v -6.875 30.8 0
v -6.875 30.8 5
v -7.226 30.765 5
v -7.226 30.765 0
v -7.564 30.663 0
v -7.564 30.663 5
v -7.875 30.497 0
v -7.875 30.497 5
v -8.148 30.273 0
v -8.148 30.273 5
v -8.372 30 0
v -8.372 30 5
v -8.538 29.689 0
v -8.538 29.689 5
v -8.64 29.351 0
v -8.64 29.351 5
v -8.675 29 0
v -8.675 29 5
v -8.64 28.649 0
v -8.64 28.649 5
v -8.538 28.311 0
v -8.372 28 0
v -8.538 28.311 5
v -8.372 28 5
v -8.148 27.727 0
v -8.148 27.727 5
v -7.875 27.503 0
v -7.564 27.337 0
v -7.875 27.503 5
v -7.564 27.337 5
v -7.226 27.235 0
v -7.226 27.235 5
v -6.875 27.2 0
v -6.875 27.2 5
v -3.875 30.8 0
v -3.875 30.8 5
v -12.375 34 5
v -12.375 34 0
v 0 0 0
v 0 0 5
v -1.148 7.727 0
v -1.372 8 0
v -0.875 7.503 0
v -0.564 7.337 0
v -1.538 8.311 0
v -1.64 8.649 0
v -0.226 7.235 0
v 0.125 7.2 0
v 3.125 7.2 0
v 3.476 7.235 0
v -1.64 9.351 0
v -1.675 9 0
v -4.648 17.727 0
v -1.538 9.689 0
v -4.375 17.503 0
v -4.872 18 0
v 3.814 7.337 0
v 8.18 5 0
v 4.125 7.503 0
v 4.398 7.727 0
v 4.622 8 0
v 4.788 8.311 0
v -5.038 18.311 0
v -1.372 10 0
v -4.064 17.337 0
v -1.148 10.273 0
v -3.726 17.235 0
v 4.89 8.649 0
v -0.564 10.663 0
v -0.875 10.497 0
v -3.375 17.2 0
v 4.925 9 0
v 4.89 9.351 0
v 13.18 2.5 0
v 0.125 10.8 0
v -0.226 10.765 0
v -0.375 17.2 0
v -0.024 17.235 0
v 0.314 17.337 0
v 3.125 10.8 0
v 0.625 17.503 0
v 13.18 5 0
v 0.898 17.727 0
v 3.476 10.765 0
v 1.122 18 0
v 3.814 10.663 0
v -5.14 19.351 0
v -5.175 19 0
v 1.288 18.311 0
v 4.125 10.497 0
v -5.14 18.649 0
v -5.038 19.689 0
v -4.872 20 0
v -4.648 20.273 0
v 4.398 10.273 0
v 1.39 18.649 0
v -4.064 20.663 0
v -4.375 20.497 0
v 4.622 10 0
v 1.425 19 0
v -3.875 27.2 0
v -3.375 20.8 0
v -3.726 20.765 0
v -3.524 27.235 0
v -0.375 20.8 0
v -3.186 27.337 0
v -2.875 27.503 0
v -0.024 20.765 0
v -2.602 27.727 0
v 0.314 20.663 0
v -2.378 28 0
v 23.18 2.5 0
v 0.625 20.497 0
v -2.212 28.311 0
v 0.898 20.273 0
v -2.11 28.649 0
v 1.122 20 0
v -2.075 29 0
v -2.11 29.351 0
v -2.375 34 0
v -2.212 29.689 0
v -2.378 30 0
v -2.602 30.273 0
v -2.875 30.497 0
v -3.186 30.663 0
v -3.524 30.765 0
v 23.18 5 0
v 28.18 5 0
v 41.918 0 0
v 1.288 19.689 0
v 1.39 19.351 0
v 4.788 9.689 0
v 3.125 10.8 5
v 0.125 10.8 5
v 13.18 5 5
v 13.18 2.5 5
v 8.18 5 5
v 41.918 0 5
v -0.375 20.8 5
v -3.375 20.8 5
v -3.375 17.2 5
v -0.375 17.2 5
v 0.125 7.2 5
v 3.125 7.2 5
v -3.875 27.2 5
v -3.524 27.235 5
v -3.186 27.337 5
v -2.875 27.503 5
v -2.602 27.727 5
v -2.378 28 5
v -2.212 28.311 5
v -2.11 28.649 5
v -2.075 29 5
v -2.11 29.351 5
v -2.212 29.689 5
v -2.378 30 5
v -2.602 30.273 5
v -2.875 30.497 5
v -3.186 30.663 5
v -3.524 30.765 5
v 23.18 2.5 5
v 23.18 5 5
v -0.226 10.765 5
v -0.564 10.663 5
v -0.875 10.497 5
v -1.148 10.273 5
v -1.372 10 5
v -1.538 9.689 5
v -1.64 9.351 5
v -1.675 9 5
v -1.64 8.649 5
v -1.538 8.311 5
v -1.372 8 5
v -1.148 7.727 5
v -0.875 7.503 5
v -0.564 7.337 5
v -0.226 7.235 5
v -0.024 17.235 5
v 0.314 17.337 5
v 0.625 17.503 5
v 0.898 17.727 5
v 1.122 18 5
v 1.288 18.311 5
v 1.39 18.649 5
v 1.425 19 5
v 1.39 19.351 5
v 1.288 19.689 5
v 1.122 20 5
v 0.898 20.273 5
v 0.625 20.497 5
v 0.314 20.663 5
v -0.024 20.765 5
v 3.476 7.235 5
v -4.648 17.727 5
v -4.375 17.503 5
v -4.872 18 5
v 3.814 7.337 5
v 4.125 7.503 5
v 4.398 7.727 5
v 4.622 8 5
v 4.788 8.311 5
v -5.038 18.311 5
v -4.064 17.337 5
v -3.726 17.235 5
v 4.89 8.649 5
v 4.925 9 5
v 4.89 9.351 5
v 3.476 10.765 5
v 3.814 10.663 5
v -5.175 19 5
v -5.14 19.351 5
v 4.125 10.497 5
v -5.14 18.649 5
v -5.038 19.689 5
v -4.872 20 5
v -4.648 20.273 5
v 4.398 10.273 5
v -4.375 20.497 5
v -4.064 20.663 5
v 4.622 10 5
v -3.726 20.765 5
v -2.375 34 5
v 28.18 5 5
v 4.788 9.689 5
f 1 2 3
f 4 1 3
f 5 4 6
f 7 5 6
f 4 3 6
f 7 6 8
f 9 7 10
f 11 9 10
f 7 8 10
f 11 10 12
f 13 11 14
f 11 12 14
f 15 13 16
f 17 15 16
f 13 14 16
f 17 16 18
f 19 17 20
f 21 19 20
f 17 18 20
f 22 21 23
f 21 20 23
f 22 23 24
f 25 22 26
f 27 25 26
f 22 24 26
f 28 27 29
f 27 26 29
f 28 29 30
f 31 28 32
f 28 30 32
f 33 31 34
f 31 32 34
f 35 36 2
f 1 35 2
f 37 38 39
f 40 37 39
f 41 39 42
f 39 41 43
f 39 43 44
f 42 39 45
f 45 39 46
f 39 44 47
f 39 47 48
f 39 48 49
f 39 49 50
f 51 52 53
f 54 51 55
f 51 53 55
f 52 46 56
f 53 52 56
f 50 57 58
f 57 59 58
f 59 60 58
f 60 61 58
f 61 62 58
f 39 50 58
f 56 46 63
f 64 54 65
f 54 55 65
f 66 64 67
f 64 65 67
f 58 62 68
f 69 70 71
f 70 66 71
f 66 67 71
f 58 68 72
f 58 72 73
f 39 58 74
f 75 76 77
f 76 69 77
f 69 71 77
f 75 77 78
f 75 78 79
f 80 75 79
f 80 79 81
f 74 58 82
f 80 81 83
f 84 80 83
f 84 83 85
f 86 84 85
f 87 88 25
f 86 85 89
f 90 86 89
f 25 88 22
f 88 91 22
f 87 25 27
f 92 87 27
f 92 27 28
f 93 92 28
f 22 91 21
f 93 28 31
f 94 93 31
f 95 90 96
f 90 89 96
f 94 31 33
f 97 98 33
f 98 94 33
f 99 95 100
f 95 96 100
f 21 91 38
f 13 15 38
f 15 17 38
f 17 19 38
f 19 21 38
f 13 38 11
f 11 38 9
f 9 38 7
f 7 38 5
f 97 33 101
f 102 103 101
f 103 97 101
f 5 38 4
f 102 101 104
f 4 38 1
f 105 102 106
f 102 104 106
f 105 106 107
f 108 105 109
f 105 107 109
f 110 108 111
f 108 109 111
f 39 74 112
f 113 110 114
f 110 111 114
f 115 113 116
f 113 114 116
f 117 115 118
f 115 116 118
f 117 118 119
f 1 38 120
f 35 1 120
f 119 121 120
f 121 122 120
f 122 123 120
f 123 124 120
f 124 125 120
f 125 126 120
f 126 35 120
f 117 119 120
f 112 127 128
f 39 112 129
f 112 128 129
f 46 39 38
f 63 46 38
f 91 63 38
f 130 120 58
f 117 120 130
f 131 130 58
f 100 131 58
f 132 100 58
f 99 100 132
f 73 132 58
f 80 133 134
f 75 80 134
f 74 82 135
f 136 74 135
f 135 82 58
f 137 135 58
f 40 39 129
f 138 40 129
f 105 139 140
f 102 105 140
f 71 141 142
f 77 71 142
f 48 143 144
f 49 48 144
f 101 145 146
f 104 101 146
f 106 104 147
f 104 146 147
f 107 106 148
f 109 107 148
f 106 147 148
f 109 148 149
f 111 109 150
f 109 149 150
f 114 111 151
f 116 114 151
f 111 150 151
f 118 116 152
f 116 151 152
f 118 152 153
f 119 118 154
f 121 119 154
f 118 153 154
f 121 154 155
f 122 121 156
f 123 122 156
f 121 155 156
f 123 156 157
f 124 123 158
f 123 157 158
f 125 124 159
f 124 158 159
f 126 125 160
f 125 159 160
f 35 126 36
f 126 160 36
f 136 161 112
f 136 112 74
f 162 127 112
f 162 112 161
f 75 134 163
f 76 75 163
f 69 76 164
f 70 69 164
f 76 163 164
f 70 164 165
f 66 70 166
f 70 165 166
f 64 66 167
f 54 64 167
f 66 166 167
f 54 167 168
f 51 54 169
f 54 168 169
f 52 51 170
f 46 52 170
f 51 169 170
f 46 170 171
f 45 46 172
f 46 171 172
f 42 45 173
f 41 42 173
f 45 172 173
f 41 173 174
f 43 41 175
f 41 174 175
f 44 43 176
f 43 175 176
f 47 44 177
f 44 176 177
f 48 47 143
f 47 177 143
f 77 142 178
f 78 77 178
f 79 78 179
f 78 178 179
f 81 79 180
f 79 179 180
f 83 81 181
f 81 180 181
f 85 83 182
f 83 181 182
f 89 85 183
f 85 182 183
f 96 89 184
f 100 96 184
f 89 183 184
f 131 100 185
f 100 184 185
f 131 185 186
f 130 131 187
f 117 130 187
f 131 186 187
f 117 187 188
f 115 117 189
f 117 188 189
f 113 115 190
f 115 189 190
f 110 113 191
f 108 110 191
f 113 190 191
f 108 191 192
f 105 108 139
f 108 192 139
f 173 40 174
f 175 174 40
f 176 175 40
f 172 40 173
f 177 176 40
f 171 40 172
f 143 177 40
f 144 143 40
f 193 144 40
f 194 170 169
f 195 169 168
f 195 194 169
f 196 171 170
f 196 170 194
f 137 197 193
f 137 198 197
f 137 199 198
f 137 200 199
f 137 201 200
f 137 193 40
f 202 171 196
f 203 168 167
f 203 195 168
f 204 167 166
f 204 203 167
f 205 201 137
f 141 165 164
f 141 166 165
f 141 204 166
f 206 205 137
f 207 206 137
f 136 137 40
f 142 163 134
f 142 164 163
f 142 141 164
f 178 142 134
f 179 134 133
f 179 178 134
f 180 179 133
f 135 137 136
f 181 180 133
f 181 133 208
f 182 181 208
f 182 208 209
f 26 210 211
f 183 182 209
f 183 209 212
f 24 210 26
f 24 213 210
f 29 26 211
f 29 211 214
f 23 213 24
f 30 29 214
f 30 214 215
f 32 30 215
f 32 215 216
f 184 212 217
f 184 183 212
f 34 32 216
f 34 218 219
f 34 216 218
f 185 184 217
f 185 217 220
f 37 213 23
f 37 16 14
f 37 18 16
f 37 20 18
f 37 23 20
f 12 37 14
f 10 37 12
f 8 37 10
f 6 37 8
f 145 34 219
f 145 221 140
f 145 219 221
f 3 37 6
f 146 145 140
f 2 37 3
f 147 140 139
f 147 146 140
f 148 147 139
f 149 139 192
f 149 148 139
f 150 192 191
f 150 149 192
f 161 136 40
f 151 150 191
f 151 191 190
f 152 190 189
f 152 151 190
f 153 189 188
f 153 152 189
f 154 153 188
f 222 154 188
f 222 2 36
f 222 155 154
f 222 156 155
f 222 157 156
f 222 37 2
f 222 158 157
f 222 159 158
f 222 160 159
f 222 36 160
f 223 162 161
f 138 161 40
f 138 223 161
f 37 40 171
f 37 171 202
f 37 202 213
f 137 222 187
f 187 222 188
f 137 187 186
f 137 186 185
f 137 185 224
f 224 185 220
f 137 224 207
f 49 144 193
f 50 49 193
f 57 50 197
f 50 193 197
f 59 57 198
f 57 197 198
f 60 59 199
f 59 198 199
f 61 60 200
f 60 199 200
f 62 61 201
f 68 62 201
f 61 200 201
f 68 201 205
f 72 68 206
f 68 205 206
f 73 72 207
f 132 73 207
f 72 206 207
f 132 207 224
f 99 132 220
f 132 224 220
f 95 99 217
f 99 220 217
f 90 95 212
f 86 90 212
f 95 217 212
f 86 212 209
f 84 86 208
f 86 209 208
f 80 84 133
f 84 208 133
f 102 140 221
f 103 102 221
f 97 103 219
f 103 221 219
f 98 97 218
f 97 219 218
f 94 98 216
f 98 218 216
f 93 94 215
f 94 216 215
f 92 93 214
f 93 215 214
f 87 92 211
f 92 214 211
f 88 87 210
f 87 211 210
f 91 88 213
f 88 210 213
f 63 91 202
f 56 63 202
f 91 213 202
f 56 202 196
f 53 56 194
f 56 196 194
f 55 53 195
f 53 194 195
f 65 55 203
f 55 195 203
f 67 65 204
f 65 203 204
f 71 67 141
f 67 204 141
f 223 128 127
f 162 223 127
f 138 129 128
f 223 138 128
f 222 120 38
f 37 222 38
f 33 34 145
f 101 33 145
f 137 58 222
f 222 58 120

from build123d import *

# Parameters (mm, degrees)
PAD_DEPTH       = 5
POCKET_DEPTH    = 5.001
SKETCH002_W     = 10
SKETCH002_H     = 5
POCKET001_DEPTH = 2.5


with BuildPart() as part:
    # Sketch → Pad (new body)
    with BuildSketch(Plane.XY):
        Polygon((-12.374988, 34), (0, 0), (41.917536, 0), (28.180149, 5), (8.180149, 5), (-2.374988, 34), align=None)
    extrude(amount=PAD_DEPTH)

    # Sketch001 (on Face8 of Pad) → Pocket (cut, through all)
    with BuildSketch(Plane.XY.offset(5)):
        with BuildLine():
            ThreePointArc((-6.874988, 30.8), (-8.674988, 29), (-6.874988, 27.2))
            Line((-6.874988, 27.2), (-3.874988, 27.2))
            ThreePointArc((-3.874988, 27.2), (-2.074988, 29), (-3.874988, 30.8))
            Line((-3.874988, 30.8), (-6.874988, 30.8))
        make_face()
        with BuildLine():
            ThreePointArc((-3.374988, 20.8), (-5.174988, 19), (-3.374988, 17.2))
            Line((-3.374988, 17.2), (-0.374988, 17.2))
            ThreePointArc((-0.374988, 17.2), (1.425012, 19), (-0.374988, 20.8))
            Line((-0.374988, 20.8), (-3.374988, 20.8))
        make_face()
        with BuildLine():
            ThreePointArc((0.125012, 10.8), (-1.674988, 9), (0.125012, 7.2))
            Line((0.125012, 7.2), (3.125012, 7.2))
            ThreePointArc((3.125012, 7.2), (4.925012, 9), (3.125012, 10.8))
            Line((3.125012, 10.8), (0.125012, 10.8))
        make_face()
    extrude(amount=-POCKET_DEPTH, mode=Mode.SUBTRACT)

    # Sketch002 (on Face8 of Pocket) → Pocket001 (cut)
    with BuildSketch(Plane(origin=(0, 5, 0), x_dir=(-1, 0, 0), z_dir=(0, 1, 0))):
        with Locations((-18.180149, 2.5)):
            Rectangle(SKETCH002_W, SKETCH002_H)
    extrude(amount=-POCKET001_DEPTH, mode=Mode.SUBTRACT)


solid = part.part
